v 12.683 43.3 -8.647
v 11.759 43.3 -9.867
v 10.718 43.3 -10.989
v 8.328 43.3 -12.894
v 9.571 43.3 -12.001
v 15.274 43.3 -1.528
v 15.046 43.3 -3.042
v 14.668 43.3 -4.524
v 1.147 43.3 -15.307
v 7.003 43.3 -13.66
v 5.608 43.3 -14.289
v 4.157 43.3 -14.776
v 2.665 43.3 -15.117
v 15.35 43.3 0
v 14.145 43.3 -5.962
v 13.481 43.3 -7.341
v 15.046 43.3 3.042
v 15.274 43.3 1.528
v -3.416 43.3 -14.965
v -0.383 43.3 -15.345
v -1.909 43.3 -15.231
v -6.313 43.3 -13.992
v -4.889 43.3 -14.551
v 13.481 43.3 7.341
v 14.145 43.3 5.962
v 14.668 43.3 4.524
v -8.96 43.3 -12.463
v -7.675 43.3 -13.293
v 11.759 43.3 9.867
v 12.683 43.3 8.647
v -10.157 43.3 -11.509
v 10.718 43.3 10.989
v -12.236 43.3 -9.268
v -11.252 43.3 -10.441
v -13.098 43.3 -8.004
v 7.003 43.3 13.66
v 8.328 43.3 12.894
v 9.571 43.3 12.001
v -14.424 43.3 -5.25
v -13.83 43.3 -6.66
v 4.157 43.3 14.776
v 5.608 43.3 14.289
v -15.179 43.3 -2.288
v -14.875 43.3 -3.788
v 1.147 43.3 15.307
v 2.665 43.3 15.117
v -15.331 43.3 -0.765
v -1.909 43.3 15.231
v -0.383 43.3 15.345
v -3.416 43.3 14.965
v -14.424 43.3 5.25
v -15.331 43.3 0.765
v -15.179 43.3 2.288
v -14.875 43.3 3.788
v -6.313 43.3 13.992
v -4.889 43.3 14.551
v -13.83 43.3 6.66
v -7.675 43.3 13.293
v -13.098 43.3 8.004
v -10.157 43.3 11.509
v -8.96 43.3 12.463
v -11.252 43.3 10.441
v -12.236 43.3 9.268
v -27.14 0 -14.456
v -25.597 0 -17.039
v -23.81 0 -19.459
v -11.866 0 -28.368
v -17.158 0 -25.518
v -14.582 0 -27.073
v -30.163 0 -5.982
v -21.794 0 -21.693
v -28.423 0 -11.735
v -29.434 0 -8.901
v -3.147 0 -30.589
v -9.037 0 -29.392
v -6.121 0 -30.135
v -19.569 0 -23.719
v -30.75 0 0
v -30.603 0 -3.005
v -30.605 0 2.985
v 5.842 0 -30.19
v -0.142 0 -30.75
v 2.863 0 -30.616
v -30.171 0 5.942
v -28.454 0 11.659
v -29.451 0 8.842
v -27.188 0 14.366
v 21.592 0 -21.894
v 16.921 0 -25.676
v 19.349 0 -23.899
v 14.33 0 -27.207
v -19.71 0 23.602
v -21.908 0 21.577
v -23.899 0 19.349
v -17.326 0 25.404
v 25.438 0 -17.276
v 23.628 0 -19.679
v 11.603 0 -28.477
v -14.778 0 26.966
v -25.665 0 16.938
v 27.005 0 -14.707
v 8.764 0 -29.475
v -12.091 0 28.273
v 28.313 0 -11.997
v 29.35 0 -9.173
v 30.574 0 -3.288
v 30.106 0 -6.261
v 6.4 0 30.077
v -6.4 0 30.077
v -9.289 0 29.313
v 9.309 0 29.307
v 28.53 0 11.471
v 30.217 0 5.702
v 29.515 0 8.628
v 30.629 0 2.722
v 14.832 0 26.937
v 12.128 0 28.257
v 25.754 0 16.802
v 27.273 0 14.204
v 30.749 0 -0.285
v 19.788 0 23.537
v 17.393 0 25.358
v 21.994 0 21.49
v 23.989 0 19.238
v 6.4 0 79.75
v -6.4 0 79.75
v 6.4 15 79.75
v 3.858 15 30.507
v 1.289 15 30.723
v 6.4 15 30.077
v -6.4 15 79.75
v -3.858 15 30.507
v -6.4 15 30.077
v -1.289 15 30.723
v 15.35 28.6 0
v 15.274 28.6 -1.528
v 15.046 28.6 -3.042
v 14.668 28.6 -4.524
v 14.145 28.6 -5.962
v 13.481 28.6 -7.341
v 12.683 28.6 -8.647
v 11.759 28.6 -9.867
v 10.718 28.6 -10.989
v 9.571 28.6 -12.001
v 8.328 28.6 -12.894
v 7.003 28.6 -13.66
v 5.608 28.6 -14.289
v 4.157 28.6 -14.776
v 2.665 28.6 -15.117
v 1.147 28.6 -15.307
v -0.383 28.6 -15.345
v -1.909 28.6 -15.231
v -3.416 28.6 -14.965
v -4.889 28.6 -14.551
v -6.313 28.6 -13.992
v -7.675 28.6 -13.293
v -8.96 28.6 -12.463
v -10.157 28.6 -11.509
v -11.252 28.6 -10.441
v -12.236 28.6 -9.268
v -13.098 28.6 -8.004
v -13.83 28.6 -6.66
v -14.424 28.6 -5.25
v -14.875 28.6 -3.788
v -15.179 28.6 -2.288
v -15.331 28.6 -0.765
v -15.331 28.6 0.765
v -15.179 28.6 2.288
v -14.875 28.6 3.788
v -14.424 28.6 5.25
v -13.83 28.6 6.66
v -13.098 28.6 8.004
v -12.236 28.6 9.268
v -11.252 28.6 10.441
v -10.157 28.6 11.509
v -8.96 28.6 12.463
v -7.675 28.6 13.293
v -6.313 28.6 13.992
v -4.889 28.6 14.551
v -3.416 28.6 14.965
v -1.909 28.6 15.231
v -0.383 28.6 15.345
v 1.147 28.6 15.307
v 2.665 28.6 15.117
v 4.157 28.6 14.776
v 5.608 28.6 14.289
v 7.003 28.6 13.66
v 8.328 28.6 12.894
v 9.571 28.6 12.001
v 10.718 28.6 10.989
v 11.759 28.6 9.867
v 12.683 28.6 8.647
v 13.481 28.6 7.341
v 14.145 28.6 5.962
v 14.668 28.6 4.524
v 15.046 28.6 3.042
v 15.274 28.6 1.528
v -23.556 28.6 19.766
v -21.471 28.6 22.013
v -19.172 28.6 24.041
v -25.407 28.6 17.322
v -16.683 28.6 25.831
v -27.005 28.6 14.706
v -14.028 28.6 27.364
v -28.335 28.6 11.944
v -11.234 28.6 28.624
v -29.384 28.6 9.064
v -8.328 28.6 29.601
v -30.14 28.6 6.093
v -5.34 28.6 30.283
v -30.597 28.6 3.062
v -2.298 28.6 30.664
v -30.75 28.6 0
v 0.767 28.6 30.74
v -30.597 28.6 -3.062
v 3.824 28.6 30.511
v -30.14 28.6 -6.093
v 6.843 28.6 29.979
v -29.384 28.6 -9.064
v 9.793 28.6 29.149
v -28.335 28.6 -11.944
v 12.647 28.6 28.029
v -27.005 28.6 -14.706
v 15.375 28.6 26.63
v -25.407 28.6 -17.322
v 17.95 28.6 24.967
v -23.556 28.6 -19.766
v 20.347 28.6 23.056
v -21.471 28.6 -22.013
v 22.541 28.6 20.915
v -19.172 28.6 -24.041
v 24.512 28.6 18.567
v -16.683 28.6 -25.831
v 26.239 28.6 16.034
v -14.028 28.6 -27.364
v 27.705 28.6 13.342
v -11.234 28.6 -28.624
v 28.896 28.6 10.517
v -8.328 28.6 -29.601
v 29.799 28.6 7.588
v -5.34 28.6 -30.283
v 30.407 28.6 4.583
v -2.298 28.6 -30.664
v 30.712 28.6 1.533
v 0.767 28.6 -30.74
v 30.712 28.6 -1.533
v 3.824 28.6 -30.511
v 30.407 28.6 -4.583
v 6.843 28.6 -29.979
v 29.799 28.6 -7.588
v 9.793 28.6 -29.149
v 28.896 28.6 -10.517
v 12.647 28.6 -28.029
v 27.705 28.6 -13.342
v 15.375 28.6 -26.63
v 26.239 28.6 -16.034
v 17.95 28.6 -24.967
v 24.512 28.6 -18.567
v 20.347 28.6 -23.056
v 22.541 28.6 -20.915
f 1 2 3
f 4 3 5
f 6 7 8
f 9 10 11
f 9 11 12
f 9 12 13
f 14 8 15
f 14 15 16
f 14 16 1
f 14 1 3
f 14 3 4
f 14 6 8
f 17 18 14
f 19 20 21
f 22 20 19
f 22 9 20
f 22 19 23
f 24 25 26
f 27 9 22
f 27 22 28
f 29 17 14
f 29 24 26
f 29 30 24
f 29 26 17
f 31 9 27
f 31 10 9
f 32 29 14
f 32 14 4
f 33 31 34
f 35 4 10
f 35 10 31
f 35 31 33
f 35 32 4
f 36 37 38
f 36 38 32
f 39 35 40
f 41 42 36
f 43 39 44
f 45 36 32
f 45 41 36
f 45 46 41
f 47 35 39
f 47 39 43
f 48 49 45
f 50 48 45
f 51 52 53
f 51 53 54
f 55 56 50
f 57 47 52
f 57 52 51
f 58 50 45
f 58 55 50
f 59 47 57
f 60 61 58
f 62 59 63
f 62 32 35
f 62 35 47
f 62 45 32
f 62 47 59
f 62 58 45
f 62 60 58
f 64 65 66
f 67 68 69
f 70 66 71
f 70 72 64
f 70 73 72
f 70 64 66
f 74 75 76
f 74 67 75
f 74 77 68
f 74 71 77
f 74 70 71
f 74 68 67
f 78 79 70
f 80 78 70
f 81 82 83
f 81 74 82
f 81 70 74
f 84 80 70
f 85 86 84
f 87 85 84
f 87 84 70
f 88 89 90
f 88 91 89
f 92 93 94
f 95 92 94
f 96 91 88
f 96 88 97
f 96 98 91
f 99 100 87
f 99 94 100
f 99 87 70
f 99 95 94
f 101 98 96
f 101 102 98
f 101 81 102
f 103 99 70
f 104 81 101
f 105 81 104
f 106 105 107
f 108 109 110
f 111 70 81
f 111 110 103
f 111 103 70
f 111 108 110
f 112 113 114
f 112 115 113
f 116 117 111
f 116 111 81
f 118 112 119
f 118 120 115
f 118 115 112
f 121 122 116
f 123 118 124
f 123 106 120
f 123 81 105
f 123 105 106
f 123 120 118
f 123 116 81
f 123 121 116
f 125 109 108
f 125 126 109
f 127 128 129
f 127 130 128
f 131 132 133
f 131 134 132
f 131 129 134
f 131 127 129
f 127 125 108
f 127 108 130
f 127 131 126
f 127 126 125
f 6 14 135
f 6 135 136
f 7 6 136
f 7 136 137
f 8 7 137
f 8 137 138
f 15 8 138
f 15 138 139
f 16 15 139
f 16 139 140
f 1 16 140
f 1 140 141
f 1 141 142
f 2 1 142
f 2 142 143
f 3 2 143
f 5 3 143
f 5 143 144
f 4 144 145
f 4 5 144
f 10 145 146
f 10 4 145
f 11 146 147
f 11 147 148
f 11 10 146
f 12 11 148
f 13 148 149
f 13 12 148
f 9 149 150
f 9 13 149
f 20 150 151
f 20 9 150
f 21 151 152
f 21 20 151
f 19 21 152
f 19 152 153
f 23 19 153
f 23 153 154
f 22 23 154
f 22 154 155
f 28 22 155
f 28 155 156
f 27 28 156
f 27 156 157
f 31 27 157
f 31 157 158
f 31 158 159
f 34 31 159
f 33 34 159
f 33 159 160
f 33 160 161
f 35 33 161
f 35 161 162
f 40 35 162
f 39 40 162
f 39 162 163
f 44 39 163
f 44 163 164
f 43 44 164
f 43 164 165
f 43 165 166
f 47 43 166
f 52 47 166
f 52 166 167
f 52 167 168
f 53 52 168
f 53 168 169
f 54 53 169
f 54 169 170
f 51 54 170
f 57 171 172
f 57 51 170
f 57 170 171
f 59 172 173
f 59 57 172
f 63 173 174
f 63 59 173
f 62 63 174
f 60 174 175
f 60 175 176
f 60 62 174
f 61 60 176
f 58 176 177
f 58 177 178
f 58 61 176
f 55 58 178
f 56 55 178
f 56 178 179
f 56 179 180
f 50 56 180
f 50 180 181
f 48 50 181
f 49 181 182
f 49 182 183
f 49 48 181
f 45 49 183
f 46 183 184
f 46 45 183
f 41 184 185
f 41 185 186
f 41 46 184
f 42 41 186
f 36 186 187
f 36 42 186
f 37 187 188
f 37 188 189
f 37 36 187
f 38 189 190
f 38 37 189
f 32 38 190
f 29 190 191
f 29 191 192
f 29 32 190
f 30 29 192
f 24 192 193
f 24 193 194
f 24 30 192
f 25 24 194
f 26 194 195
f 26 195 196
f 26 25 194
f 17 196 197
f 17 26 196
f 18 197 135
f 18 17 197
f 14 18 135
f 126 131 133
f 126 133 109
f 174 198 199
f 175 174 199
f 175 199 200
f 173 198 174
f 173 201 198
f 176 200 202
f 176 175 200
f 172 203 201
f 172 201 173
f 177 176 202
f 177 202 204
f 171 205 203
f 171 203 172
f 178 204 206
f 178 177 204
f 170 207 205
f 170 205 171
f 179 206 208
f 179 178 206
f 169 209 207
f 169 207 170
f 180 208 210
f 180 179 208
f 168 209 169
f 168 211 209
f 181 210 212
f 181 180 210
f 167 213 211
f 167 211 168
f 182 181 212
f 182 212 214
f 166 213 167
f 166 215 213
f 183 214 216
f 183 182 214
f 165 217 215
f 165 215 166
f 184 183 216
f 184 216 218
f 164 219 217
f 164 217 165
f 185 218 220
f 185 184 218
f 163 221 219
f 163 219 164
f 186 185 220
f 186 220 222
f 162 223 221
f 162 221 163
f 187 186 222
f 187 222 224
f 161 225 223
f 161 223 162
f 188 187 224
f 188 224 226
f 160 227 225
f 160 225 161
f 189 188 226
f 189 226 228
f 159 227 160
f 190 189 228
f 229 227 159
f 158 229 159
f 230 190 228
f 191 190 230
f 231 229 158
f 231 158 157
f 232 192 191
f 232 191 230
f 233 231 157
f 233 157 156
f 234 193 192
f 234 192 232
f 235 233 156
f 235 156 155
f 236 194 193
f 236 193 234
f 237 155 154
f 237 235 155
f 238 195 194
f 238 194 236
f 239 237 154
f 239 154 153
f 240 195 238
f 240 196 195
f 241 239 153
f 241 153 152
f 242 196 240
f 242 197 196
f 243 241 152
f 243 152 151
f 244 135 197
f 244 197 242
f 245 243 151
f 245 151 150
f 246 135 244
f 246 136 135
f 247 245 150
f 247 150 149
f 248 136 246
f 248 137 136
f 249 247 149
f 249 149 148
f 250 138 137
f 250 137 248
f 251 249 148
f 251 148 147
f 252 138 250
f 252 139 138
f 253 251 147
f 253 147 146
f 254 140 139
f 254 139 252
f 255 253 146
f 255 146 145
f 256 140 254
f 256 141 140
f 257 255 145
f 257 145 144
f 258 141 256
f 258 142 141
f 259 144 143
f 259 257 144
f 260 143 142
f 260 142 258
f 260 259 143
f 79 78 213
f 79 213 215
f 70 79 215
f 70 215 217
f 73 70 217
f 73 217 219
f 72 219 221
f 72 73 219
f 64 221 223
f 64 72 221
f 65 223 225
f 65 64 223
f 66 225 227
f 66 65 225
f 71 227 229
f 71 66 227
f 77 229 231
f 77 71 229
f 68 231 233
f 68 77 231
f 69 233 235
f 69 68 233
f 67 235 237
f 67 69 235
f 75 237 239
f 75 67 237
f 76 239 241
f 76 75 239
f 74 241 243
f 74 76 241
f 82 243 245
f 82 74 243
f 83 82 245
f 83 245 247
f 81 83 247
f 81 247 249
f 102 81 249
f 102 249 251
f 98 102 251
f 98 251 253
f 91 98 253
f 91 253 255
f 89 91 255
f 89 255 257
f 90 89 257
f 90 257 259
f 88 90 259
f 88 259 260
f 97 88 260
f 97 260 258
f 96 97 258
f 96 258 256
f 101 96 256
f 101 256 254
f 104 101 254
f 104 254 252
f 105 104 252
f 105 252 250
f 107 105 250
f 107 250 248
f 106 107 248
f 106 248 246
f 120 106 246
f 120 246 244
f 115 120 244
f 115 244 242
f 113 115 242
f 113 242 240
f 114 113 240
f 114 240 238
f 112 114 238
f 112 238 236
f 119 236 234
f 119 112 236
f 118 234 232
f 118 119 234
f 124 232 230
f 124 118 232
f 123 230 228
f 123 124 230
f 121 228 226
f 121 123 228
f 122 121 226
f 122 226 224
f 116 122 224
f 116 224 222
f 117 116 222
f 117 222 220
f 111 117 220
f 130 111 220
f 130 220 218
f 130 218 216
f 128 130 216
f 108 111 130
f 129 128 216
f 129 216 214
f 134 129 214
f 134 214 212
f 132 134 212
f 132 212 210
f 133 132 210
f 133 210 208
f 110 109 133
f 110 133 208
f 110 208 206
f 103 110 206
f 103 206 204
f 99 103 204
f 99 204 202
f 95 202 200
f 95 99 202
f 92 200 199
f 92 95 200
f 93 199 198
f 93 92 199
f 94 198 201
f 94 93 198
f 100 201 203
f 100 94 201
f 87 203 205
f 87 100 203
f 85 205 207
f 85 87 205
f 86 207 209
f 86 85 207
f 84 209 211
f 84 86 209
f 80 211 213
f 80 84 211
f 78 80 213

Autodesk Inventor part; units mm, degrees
ref_plane "YZ Plane" through (0, 0, 0) normal (1, 0, 0) x (0, 1, 0)
ref_plane "XZ Plane" through (0, 0, 0) normal (0, 1, 0) x (-1, 0, 0)
sketch "Sketch1" plane through (0, 0, 0) normal (0, 1, 0) x (-1, 0, 0)
  circle A0 centre (0, 0) radius 30.75
  dimension "d0" = 61.5
extrude "Extrusion1" add sketch "Sketch1" along normal blind 43.3
ref_plane "Work Plane1" through (0, 0, 30.75) normal (0, 0, 1) x (1, 0, 0)
sketch "Sketch2" plane through (0, 0, 30.75) normal (0, 0, 1) x (1, 0, 0)
  line L0 (30.75, 0) -> (-30.75, 0) projected
  line L1 (6.4, 15) -> (-6.4, 15)
  line L2 (-6.4, 15) -> (-6.4, 0)
  line L3 (-6.4, 0) -> (6.4, 0)
  line L4 (6.4, 0) -> (6.4, 15)
extrude "Extrusion2" add sketch "Sketch2" along normal blind 49
sketch "Sketch3" plane through (0, 0, 30.75) normal (0, 0, -1) x (-1, 0, 0)
  line L0 (6.4, 15) -> (6.4, 0) projected
  line L1 (-6.4, 0) -> (-6.4, 15) projected
  line L2 (6.4, 0) -> (-6.4, 0)
  line L3 (-6.4, 0) -> (-6.4, 15)
  line L4 (-6.4, 15) -> (6.4, 15)
  line L5 (6.4, 15) -> (6.4, 0)
  point P0 (0, 0)
extrude "Extrusion3" add sketch "Sketch3" along normal blind 5
sketch "Sketch4" plane through (0, 43.3, 0) normal (0, 1, 0) x (1, 0, 0)
  circle A0 centre (0, 0) radius 15.35
  circle A1 centre (0, 0) radius 30.75
  dimension "d10" = 30.7
extrude "Extrusion4" cut sketch "Sketch4" against normal blind 14.7
properties part number "Camara"
